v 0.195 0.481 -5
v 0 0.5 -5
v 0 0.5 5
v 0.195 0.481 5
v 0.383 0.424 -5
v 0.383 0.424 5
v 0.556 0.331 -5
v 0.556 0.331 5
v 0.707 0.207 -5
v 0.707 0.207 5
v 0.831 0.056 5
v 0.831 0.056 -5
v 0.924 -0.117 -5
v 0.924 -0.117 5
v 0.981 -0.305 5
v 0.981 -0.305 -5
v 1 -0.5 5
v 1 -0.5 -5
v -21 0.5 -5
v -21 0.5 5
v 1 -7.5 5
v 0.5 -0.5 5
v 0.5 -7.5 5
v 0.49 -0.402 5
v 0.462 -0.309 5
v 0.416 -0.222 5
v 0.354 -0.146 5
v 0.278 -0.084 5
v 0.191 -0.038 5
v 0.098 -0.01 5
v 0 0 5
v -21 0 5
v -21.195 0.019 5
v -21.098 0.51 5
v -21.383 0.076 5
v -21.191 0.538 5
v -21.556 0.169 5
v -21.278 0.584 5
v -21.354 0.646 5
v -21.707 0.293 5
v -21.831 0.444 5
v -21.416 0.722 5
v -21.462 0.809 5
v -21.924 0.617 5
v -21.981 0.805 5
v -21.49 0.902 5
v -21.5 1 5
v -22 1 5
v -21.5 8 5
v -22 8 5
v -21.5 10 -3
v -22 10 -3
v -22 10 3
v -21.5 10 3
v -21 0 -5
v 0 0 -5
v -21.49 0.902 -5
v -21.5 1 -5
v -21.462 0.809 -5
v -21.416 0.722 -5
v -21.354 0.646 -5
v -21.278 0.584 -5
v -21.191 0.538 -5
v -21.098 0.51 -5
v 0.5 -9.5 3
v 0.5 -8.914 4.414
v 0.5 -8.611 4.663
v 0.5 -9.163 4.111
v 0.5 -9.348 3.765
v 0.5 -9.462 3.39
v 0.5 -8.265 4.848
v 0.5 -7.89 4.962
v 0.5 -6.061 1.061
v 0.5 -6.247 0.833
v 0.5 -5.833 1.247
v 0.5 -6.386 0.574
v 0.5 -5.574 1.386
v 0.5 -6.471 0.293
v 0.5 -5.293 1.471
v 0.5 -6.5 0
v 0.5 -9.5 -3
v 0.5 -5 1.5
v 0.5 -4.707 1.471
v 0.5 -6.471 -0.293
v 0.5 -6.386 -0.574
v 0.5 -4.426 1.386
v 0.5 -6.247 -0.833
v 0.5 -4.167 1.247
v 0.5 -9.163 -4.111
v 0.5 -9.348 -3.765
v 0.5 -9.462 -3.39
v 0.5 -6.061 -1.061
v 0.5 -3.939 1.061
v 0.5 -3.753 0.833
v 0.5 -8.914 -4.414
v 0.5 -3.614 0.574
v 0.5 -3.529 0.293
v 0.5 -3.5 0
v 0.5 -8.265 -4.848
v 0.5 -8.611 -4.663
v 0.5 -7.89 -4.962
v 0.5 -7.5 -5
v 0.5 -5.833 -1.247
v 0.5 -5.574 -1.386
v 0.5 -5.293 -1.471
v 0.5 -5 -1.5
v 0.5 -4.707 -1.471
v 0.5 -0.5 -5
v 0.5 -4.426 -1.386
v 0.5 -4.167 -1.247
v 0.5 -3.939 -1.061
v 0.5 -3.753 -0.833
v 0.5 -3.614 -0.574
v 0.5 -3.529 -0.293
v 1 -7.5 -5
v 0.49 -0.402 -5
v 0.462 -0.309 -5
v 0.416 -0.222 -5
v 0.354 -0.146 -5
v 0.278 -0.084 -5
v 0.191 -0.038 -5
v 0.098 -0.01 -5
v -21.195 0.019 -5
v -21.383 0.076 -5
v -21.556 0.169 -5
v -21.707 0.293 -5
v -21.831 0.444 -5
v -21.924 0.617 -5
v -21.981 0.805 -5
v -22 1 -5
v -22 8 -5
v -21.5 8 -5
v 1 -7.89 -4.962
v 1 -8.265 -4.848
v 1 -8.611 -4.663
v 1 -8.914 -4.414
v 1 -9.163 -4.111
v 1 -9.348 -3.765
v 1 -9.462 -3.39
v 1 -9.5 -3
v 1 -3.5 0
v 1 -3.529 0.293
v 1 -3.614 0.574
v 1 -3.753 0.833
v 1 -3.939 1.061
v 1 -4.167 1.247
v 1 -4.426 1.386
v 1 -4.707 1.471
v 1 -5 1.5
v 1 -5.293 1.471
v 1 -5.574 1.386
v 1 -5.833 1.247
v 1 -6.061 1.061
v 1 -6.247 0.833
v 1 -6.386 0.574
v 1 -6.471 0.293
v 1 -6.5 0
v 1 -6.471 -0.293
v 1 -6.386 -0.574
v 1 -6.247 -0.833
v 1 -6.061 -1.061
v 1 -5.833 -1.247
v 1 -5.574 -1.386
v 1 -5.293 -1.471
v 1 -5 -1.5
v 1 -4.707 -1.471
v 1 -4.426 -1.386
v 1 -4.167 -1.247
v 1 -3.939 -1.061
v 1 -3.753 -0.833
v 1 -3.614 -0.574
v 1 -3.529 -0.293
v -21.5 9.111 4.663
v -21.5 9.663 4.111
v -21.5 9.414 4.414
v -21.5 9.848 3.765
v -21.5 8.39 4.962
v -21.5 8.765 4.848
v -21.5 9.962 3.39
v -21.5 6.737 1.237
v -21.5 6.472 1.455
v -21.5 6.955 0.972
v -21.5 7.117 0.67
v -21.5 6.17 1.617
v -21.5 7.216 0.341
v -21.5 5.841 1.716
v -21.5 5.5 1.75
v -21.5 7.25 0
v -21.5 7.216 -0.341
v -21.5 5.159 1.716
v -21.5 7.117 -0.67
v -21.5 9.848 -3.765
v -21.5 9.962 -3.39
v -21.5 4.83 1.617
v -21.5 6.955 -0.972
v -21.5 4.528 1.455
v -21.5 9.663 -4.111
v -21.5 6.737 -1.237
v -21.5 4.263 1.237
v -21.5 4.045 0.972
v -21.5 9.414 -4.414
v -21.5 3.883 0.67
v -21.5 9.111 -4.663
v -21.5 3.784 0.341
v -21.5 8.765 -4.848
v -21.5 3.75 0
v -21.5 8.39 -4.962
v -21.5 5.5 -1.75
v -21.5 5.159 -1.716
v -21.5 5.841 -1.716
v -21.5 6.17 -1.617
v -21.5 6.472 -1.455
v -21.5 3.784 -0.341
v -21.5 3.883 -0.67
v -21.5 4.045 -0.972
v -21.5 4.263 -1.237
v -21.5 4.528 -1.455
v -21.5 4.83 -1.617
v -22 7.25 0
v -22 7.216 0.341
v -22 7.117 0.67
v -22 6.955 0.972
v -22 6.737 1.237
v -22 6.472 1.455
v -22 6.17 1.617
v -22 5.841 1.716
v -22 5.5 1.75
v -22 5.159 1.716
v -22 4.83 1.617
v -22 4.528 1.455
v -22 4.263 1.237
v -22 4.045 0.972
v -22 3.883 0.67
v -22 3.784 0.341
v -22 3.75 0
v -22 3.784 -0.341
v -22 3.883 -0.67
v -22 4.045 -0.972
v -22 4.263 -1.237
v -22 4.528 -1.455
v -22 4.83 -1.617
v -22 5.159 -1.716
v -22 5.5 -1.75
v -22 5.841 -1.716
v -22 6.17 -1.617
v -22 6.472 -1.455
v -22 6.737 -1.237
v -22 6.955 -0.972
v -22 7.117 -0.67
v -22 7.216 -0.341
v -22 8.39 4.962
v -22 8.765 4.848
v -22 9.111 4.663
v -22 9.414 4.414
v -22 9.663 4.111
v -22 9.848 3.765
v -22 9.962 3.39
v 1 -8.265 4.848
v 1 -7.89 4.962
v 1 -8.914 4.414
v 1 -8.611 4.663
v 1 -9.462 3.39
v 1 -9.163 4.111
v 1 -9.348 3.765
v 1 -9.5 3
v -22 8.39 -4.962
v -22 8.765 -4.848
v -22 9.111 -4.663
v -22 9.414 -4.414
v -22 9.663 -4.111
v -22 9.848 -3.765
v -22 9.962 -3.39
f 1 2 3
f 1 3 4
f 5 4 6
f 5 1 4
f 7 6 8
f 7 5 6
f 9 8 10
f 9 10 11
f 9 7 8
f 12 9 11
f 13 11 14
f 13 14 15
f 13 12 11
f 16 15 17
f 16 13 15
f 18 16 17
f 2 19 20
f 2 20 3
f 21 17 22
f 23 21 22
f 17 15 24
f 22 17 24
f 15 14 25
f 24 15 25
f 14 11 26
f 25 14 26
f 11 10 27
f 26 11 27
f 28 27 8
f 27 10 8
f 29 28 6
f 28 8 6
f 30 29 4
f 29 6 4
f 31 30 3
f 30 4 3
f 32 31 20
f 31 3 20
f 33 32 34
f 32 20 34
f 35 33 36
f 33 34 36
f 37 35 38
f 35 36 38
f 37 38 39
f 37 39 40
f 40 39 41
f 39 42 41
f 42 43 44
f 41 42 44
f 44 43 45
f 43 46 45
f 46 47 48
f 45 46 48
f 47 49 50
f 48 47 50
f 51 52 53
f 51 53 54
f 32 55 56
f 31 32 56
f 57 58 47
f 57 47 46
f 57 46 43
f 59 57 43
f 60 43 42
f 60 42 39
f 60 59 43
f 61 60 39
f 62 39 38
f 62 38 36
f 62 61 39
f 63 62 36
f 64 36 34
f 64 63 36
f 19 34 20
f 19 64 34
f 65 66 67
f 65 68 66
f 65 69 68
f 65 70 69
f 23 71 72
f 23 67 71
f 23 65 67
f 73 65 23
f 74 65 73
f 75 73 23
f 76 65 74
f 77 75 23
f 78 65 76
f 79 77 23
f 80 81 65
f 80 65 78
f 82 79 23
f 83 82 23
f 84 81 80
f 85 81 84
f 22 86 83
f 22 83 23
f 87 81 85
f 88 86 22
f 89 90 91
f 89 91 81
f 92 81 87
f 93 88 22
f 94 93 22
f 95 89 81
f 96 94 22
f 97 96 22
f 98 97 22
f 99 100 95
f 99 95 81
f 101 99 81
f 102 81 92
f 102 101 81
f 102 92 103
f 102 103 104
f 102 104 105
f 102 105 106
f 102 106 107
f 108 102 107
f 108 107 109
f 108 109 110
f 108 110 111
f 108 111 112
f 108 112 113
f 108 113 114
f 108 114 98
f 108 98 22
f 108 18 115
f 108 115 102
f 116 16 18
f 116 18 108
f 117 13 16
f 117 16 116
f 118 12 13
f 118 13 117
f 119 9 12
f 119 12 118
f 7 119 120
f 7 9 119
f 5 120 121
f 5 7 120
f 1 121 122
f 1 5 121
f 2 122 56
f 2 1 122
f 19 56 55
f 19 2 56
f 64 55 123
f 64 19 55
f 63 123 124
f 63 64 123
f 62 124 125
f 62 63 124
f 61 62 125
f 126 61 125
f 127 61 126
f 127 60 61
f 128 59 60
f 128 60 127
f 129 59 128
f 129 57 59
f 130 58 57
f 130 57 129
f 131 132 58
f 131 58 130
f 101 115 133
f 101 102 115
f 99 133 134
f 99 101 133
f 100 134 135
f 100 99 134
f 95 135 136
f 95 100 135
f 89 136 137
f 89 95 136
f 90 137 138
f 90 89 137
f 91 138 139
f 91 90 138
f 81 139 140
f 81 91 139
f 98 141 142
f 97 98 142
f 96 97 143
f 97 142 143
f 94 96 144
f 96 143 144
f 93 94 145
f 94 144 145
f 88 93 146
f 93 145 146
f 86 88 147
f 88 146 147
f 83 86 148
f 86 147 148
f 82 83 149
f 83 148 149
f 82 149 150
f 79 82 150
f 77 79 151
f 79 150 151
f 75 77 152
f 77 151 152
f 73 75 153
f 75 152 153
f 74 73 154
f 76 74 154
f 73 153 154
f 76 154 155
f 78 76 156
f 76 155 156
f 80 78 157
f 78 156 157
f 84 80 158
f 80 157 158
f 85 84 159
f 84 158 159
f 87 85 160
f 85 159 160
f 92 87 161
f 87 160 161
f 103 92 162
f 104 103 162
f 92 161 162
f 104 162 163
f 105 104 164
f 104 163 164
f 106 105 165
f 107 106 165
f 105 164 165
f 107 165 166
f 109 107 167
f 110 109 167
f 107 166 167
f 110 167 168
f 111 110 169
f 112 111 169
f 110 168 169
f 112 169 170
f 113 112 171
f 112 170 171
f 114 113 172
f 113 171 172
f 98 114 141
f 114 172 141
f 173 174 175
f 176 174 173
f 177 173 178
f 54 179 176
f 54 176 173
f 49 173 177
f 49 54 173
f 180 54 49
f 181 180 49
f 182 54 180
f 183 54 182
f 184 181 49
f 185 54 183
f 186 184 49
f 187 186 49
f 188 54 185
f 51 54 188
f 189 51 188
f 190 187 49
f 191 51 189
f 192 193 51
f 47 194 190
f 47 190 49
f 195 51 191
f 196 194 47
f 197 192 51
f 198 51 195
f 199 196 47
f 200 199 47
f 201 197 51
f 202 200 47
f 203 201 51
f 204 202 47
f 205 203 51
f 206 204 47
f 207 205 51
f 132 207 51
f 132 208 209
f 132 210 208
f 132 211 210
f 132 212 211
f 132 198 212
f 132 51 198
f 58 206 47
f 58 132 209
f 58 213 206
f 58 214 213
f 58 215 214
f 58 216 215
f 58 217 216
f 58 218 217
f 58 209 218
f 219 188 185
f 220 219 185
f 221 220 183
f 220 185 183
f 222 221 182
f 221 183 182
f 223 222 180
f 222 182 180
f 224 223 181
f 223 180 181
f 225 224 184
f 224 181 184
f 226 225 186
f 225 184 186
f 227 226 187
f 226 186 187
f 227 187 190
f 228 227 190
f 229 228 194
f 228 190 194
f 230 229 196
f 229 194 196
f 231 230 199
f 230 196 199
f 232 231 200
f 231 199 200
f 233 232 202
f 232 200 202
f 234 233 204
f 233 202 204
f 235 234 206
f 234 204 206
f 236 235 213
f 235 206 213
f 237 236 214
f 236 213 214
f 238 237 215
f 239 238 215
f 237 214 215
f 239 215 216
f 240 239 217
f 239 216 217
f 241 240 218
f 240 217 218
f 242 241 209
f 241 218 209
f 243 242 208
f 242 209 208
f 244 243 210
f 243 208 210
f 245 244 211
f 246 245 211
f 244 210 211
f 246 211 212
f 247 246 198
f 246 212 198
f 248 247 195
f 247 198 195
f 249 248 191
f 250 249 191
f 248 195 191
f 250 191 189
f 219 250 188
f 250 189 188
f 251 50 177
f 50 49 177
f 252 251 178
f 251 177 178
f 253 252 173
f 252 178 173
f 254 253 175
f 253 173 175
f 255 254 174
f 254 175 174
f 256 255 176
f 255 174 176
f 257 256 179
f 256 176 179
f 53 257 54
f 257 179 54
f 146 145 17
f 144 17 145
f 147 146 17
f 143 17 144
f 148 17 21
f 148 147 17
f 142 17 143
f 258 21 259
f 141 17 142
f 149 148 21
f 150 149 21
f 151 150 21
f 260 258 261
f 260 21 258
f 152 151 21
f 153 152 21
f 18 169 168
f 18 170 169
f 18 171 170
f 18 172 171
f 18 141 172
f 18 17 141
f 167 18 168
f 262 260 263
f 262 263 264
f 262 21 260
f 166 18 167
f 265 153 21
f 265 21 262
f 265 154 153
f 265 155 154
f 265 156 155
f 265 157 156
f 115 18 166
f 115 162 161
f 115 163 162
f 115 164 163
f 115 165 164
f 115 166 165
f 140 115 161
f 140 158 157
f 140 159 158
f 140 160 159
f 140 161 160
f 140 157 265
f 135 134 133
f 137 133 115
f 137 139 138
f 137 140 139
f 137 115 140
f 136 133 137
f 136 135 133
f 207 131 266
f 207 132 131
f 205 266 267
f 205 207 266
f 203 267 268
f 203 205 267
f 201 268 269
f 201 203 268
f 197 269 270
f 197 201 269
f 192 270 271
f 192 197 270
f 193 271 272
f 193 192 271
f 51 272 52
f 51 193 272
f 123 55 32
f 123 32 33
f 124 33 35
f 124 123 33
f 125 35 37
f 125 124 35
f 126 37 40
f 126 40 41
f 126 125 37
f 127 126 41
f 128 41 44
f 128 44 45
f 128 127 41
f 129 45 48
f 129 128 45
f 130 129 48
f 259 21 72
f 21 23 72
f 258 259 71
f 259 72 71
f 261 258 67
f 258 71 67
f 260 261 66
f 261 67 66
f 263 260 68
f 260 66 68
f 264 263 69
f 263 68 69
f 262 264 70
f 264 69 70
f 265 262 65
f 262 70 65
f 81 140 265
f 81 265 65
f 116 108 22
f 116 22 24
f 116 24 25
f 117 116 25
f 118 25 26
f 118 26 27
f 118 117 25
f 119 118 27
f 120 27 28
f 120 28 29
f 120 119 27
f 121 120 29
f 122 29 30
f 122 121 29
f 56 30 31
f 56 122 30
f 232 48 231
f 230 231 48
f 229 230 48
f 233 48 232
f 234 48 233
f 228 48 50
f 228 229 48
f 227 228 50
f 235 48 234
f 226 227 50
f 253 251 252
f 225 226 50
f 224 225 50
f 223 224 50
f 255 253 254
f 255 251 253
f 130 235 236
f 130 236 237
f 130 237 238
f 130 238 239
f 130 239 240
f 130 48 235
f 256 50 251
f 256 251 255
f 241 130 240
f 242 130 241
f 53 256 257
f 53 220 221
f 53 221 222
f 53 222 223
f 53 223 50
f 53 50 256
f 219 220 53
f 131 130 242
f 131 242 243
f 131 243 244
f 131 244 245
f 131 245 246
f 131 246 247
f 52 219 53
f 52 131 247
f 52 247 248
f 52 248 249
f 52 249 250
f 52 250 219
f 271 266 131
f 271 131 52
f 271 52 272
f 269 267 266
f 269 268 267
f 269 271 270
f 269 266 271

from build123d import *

# Parameters (mm, degrees)
SKETCH_1_W                       = 23
SKETCH_1_H                       = 10
EXTRUDE_1_DEPTH                  = 0.5
SM_EDGE_FLANGE_1_STRIP_W         = 3
SM_EDGE_FLANGE_1_STRIP_H         = 0.5
SM_EDGE_FLANGE_1_STRIP_CUT_DEPTH = 10
SM_EDGE_FLANGE_1_DEPTH           = 10
SM_EDGE_FLANGE_2_STRIP_W         = 3
SM_EDGE_FLANGE_2_STRIP_H         = 0.5
SM_EDGE_FLANGE_2_STRIP_CUT_DEPTH = 10
SM_EDGE_FLANGE_2_DEPTH           = 10
SKETCH_12_R                      = 1.5
CUT_EXTRUDE_1_DEPTH              = 0.5
SKETCH_13_R                      = 1.75
CUT_EXTRUDE_2_DEPTH              = 0.5
FILLET_1_R                       = 2


# Sheet-metal steps are written as plain solids
with BuildPart() as part:
    # Sketch 1 → Бобышка-Вытянуть1 (new body)
    with BuildSketch(Plane(origin=(0, 0, 0), x_dir=(1, 0, 0), z_dir=(0, 1, 0))):
        with Locations((-10.5, 0)):
            Rectangle(SKETCH_1_W, SKETCH_1_H)
    extrude(amount=EXTRUDE_1_DEPTH)

    # Ребро-кромка1 strip (across the edge) → Ребро-кромка1 strip cut (cut)
    with BuildSketch(Plane(origin=(1, 0, -5), x_dir=(-1, 0, 0), z_dir=(0, 0, 1))):
        with Locations((-0.5, -0.25)):
            Rectangle(SM_EDGE_FLANGE_1_STRIP_W, SM_EDGE_FLANGE_1_STRIP_H)
    extrude(amount=SM_EDGE_FLANGE_1_STRIP_CUT_DEPTH, mode=Mode.SUBTRACT)

    # Ребро-кромка1 section (across the edge) → Ребро-кромка1 (add)
    with BuildSketch(Plane(origin=(1, 0, -5), x_dir=(-1, 0, 0), z_dir=(0, 0, 1))):
        with BuildLine():
            Line((0, 0.5), (0, 9.5))
            Line((0, 9.5), (0.5, 9.5))
            Line((0.5, 9.5), (0.5, 0.5))
            ThreePointArc((0.5, 0.5), (0.646446609, 0.146446609), (1, 0))
            Line((1, 0), (1, -0.5))
            ThreePointArc((1, -0.5), (0.292893219, -0.207106781), (0, 0.5))
        make_face()
    extrude(amount=SM_EDGE_FLANGE_1_DEPTH)

    # Ребро-кромка2 strip (across the edge) → Ребро-кромка2 strip cut (cut)
    with BuildSketch(Plane(origin=(-22, 0.5, -5), x_dir=(1, 0, 0), z_dir=(0, 0, 1))):
        with Locations((-0.5, -0.25)):
            Rectangle(SM_EDGE_FLANGE_2_STRIP_W, SM_EDGE_FLANGE_2_STRIP_H)
    extrude(amount=SM_EDGE_FLANGE_2_STRIP_CUT_DEPTH, mode=Mode.SUBTRACT)

    # Ребро-кромка2 section (across the edge) → Ребро-кромка2 (add)
    with BuildSketch(Plane(origin=(-22, 0.5, -5), x_dir=(1, 0, 0), z_dir=(0, 0, 1))):
        with BuildLine():
            Line((0, 0.5), (0, 9.5))
            Line((0, 9.5), (0.5, 9.5))
            Line((0.5, 9.5), (0.5, 0.5))
            ThreePointArc((0.5, 0.5), (0.646446609, 0.146446609), (1, 0))
            Line((1, 0), (1, -0.5))
            ThreePointArc((1, -0.5), (0.292893219, -0.207106781), (0, 0.5))
        make_face()
    extrude(amount=SM_EDGE_FLANGE_2_DEPTH)

    # Эскиз12 → Вырез-Вытянуть1 (cut)
    with BuildSketch(Plane(origin=(1, 0, 0), x_dir=(0, 0, -1), z_dir=(1, 0, 0))):
        with Locations(Location((0, -5, 0), (0, 0, 90))):
            Circle(SKETCH_12_R)
    extrude(amount=-CUT_EXTRUDE_1_DEPTH, mode=Mode.SUBTRACT)

    # Эскиз13 → Вырез-Вытянуть2 (cut)
    with BuildSketch(Plane(origin=(-21.5, 0, 0), x_dir=(0, 0, -1), z_dir=(1, 0, 0))):
        with Locations(Location((0, 5.5, 0), (0, 0, 90))):
            Circle(SKETCH_13_R)
    extrude(amount=-CUT_EXTRUDE_2_DEPTH, mode=Mode.SUBTRACT)

    # Скругление1
    fillet_1_edges = [part.edges().sort_by_distance(p)[0] for p in [
        (0.75, -9.5, -5),
        (0.75, -9.5, 5),
        (-21.75, 10, -5),
        (-21.75, 10, 5),
    ]]
    fillet(fillet_1_edges, radius=FILLET_1_R)


solid = part.part
